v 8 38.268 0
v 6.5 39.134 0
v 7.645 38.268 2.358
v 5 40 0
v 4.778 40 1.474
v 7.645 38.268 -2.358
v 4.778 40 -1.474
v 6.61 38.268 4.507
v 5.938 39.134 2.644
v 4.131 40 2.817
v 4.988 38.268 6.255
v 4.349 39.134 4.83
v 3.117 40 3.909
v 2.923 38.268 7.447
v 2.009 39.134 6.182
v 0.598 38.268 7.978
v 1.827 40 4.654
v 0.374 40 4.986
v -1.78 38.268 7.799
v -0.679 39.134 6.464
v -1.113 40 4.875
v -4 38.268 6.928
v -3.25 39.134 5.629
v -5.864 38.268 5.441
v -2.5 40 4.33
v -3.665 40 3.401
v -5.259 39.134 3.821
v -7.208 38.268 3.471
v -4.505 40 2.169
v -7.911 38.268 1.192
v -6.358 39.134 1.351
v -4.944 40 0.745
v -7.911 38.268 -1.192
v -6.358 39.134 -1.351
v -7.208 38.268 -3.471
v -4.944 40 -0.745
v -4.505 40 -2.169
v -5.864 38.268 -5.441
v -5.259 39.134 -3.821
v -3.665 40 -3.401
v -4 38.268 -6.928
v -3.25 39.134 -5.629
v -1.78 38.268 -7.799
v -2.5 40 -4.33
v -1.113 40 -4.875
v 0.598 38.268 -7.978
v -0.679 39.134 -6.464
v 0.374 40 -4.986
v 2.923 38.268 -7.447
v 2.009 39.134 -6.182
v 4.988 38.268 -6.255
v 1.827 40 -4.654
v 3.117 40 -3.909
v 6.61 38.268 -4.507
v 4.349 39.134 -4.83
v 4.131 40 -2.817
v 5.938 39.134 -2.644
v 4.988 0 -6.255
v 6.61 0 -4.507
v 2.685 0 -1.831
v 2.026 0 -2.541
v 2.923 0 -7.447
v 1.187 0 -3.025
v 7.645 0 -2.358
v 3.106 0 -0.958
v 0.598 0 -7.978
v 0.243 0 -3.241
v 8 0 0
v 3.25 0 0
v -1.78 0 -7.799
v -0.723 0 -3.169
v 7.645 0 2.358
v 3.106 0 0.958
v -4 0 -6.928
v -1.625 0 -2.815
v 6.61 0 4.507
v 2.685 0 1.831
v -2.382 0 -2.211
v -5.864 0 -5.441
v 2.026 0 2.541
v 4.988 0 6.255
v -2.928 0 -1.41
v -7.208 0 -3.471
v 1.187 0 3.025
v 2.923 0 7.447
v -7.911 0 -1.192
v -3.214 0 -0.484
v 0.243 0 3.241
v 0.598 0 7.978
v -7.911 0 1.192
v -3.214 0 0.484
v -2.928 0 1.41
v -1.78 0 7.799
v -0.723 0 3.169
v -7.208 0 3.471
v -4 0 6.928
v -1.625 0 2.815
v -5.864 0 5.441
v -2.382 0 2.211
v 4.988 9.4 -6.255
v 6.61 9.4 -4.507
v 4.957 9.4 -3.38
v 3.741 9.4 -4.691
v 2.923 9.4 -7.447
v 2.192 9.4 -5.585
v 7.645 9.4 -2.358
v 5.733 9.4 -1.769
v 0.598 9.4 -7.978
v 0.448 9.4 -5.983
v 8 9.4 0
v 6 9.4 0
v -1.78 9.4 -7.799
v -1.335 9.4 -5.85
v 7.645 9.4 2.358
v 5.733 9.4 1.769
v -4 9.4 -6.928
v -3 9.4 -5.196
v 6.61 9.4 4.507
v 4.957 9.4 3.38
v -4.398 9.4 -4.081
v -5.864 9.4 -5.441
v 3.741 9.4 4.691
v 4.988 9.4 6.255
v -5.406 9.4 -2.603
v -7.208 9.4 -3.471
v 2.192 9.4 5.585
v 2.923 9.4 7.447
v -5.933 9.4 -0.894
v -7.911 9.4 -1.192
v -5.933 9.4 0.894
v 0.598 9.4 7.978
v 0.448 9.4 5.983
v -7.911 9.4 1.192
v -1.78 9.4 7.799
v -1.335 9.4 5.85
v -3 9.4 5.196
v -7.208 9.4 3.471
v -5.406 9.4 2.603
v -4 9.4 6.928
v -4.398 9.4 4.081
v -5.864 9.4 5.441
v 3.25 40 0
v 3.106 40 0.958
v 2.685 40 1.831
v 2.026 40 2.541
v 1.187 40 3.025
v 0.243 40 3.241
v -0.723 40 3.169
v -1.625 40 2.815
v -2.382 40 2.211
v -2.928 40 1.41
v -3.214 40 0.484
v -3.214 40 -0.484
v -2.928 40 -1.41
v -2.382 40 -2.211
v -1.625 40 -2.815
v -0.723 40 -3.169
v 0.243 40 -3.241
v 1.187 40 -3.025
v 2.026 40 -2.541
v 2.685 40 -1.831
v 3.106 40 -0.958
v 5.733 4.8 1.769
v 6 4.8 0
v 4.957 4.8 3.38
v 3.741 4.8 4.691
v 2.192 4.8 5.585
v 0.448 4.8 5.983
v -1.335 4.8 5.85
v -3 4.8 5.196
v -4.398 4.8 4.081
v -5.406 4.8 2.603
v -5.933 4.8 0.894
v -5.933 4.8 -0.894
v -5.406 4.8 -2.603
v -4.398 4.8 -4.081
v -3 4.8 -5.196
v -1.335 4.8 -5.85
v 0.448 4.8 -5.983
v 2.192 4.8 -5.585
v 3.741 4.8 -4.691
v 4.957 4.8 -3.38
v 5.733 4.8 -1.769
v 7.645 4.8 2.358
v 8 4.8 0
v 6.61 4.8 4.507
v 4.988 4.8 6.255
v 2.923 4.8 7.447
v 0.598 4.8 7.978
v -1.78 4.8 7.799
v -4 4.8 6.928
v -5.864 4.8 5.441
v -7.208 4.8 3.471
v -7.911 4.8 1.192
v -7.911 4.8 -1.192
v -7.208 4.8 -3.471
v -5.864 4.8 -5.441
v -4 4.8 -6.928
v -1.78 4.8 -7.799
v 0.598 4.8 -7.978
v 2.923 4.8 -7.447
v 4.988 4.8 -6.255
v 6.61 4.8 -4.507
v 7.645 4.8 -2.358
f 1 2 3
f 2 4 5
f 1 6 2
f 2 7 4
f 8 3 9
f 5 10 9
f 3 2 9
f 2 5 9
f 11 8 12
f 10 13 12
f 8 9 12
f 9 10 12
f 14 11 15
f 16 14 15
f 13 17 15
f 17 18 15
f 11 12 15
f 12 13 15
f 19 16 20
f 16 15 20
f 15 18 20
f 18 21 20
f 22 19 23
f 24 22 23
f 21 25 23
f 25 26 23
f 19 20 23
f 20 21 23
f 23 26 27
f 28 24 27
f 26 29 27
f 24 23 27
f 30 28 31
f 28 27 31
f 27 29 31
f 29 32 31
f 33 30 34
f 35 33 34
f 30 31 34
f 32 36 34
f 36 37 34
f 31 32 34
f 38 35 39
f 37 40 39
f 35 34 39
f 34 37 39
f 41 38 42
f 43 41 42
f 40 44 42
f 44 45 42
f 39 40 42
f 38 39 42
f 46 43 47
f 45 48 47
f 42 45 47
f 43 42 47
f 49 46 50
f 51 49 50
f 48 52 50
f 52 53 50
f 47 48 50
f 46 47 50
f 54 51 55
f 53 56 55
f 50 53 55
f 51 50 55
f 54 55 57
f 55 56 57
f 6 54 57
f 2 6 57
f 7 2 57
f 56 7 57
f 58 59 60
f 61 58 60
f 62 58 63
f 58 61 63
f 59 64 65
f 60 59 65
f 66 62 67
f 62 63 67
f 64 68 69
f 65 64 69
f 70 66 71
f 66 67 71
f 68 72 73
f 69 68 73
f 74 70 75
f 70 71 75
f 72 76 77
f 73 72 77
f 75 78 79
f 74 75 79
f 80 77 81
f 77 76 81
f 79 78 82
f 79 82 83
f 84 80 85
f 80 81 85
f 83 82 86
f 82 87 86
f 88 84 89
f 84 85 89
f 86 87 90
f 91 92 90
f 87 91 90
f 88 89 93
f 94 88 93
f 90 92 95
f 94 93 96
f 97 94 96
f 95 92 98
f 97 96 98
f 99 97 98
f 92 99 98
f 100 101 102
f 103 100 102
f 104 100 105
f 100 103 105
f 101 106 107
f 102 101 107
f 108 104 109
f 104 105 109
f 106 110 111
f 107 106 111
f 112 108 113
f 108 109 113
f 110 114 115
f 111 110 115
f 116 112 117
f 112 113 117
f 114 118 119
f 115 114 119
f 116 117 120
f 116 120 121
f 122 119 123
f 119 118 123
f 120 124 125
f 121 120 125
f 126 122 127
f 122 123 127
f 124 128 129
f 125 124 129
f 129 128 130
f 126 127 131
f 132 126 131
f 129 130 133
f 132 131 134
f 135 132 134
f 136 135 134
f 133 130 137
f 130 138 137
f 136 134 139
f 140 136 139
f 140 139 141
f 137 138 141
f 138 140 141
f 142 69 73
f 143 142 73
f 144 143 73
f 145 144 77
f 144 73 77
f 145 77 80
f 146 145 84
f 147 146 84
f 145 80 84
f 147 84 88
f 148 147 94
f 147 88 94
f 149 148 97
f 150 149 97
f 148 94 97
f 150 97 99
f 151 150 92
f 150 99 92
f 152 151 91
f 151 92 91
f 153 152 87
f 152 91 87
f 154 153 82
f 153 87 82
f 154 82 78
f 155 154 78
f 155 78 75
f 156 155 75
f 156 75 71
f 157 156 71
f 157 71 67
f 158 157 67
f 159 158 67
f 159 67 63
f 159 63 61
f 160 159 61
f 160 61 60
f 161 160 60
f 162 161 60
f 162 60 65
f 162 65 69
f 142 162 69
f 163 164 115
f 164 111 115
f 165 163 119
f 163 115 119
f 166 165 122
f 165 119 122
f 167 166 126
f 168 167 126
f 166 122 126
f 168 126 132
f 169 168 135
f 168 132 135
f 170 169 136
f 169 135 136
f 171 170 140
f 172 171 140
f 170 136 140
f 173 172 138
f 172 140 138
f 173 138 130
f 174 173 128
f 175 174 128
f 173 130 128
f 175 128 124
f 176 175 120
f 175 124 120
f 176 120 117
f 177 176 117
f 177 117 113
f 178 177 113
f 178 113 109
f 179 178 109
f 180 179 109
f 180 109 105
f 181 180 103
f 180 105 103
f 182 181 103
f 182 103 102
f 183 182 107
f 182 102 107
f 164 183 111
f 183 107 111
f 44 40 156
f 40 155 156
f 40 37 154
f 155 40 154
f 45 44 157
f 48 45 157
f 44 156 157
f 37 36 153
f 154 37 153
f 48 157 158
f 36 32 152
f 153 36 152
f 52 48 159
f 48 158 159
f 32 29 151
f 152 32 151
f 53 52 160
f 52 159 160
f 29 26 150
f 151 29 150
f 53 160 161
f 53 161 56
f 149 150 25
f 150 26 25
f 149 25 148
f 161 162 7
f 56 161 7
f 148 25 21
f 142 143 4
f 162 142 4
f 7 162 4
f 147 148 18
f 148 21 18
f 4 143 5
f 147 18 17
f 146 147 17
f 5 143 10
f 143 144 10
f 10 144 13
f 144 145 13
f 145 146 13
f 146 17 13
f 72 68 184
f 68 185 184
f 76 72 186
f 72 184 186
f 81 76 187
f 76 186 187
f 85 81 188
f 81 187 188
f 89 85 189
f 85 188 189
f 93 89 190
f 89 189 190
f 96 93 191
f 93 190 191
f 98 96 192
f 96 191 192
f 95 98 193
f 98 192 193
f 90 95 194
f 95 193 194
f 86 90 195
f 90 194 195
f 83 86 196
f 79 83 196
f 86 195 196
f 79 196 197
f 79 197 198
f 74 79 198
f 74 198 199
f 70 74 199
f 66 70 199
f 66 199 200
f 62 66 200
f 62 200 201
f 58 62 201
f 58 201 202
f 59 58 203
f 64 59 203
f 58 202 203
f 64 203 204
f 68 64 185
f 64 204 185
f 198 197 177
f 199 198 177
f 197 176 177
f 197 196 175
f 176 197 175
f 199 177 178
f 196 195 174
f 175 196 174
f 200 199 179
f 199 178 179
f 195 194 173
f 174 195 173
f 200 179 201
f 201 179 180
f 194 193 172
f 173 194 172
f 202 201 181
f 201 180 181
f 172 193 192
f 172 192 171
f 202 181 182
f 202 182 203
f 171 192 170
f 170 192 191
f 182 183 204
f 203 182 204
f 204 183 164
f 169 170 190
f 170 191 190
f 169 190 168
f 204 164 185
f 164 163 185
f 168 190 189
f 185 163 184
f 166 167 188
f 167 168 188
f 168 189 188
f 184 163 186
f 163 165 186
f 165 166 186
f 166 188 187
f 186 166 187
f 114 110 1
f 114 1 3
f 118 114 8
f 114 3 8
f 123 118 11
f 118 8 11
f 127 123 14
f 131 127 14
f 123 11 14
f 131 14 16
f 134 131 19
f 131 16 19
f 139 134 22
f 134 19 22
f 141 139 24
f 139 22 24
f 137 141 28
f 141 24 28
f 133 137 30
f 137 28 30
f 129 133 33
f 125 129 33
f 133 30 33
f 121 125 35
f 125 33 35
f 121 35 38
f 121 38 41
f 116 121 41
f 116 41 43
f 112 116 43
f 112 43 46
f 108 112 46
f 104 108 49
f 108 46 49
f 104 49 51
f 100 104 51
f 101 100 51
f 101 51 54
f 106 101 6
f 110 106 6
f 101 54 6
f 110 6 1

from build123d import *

# Parameters (mm, degrees)
SKETCH3_R          = 3.25
CUT_EXTRUDE1_DEPTH = 41


with BuildPart() as part:
    # Sketch2 → Revolve1 (revolve)
    with BuildSketch(Plane.XY):
        Polygon((0, 0), (8, 0), (8, 4.8), (6, 4.8), (6, 9.4), (8, 9.4), (8, 38.267949192), (5, 40), (0, 40), align=None)
    revolve(axis=Axis((0, 40, 0), (0, -1, 0)))

    # Sketch3 → Cut-Extrude1 (cut, through all)
    with BuildSketch(Plane.XZ):
        Circle(SKETCH3_R)
    extrude(amount=-CUT_EXTRUDE1_DEPTH, mode=Mode.SUBTRACT)


solid = part.part
